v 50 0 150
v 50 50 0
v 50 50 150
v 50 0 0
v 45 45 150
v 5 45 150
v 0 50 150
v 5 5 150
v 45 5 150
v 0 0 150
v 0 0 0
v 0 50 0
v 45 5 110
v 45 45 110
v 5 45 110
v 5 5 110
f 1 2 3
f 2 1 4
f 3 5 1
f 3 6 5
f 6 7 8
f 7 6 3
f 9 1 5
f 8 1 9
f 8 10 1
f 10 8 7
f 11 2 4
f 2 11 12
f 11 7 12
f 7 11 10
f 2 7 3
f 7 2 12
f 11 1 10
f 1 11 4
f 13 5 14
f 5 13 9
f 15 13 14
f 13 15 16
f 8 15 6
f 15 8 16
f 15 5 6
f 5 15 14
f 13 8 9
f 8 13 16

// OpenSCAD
/*
Bed Corner Post Holder

By Paul Houghton
Twitter: @mobile_rat
Email: paulirotta@gmail.com
Blog: http://paul-houghton.com/

Creative Commons Attribution ShareAlike License
https://creativecommons.org/licenses/by-sa/4.0/legalcode
*/


/* [Post Holder Options] */
// Width of the holder (inside dimension)
Width = 50;

// Wall thickness (reduces Width to create the holder)
Wall_Thickness = 5;
w2 = Width - 2*Wall_Thickness;

// Height to the support level
Height = 110;

// Additional height above the support level
Wall_Height = 40;
h2 = Height + Wall_Height;

difference() {
    cube([Width,Width,h2]);
    translate([Wall_Thickness, Wall_Thickness, Height])
        cube([w2,w2,Height]);
};
